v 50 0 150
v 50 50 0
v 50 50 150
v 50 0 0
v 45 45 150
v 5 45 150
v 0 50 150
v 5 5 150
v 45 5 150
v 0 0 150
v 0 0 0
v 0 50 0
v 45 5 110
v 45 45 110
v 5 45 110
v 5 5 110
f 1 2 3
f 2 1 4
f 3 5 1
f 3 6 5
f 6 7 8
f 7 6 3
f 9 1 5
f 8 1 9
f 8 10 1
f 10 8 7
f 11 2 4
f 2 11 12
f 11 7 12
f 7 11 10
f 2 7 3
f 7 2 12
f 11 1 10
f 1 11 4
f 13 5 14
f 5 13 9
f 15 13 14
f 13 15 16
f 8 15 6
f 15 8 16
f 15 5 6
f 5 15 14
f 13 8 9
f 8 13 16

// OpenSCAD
/*
Bed Corner Post Holder

By Paul Houghton
Twitter: @mobile_rat
Email: paulirotta@gmail.com
Blog: http://paul-houghton.com/

Creative Commons Attribution ShareAlike License
https://creativecommons.org/licenses/by-sa/4.0/legalcode
*/


/* [Post Holder Options] */
// Width of the holder (inside dimension)
Width = 50;

// Wall thickness (reduces Width to create the holder)
Wall_Thickness = 5;
w2 = Width - 2*Wall_Thickness;

// Height to the support level
Height = 110;

// Additional height above the support level
Wall_Height = 40;
h2 = Height + Wall_Height;

difference() {
    cube([Width,Width,h2]);
    translate([Wall_Thickness, Wall_Thickness, Height])
        cube([w2,w2,Height]);
};
